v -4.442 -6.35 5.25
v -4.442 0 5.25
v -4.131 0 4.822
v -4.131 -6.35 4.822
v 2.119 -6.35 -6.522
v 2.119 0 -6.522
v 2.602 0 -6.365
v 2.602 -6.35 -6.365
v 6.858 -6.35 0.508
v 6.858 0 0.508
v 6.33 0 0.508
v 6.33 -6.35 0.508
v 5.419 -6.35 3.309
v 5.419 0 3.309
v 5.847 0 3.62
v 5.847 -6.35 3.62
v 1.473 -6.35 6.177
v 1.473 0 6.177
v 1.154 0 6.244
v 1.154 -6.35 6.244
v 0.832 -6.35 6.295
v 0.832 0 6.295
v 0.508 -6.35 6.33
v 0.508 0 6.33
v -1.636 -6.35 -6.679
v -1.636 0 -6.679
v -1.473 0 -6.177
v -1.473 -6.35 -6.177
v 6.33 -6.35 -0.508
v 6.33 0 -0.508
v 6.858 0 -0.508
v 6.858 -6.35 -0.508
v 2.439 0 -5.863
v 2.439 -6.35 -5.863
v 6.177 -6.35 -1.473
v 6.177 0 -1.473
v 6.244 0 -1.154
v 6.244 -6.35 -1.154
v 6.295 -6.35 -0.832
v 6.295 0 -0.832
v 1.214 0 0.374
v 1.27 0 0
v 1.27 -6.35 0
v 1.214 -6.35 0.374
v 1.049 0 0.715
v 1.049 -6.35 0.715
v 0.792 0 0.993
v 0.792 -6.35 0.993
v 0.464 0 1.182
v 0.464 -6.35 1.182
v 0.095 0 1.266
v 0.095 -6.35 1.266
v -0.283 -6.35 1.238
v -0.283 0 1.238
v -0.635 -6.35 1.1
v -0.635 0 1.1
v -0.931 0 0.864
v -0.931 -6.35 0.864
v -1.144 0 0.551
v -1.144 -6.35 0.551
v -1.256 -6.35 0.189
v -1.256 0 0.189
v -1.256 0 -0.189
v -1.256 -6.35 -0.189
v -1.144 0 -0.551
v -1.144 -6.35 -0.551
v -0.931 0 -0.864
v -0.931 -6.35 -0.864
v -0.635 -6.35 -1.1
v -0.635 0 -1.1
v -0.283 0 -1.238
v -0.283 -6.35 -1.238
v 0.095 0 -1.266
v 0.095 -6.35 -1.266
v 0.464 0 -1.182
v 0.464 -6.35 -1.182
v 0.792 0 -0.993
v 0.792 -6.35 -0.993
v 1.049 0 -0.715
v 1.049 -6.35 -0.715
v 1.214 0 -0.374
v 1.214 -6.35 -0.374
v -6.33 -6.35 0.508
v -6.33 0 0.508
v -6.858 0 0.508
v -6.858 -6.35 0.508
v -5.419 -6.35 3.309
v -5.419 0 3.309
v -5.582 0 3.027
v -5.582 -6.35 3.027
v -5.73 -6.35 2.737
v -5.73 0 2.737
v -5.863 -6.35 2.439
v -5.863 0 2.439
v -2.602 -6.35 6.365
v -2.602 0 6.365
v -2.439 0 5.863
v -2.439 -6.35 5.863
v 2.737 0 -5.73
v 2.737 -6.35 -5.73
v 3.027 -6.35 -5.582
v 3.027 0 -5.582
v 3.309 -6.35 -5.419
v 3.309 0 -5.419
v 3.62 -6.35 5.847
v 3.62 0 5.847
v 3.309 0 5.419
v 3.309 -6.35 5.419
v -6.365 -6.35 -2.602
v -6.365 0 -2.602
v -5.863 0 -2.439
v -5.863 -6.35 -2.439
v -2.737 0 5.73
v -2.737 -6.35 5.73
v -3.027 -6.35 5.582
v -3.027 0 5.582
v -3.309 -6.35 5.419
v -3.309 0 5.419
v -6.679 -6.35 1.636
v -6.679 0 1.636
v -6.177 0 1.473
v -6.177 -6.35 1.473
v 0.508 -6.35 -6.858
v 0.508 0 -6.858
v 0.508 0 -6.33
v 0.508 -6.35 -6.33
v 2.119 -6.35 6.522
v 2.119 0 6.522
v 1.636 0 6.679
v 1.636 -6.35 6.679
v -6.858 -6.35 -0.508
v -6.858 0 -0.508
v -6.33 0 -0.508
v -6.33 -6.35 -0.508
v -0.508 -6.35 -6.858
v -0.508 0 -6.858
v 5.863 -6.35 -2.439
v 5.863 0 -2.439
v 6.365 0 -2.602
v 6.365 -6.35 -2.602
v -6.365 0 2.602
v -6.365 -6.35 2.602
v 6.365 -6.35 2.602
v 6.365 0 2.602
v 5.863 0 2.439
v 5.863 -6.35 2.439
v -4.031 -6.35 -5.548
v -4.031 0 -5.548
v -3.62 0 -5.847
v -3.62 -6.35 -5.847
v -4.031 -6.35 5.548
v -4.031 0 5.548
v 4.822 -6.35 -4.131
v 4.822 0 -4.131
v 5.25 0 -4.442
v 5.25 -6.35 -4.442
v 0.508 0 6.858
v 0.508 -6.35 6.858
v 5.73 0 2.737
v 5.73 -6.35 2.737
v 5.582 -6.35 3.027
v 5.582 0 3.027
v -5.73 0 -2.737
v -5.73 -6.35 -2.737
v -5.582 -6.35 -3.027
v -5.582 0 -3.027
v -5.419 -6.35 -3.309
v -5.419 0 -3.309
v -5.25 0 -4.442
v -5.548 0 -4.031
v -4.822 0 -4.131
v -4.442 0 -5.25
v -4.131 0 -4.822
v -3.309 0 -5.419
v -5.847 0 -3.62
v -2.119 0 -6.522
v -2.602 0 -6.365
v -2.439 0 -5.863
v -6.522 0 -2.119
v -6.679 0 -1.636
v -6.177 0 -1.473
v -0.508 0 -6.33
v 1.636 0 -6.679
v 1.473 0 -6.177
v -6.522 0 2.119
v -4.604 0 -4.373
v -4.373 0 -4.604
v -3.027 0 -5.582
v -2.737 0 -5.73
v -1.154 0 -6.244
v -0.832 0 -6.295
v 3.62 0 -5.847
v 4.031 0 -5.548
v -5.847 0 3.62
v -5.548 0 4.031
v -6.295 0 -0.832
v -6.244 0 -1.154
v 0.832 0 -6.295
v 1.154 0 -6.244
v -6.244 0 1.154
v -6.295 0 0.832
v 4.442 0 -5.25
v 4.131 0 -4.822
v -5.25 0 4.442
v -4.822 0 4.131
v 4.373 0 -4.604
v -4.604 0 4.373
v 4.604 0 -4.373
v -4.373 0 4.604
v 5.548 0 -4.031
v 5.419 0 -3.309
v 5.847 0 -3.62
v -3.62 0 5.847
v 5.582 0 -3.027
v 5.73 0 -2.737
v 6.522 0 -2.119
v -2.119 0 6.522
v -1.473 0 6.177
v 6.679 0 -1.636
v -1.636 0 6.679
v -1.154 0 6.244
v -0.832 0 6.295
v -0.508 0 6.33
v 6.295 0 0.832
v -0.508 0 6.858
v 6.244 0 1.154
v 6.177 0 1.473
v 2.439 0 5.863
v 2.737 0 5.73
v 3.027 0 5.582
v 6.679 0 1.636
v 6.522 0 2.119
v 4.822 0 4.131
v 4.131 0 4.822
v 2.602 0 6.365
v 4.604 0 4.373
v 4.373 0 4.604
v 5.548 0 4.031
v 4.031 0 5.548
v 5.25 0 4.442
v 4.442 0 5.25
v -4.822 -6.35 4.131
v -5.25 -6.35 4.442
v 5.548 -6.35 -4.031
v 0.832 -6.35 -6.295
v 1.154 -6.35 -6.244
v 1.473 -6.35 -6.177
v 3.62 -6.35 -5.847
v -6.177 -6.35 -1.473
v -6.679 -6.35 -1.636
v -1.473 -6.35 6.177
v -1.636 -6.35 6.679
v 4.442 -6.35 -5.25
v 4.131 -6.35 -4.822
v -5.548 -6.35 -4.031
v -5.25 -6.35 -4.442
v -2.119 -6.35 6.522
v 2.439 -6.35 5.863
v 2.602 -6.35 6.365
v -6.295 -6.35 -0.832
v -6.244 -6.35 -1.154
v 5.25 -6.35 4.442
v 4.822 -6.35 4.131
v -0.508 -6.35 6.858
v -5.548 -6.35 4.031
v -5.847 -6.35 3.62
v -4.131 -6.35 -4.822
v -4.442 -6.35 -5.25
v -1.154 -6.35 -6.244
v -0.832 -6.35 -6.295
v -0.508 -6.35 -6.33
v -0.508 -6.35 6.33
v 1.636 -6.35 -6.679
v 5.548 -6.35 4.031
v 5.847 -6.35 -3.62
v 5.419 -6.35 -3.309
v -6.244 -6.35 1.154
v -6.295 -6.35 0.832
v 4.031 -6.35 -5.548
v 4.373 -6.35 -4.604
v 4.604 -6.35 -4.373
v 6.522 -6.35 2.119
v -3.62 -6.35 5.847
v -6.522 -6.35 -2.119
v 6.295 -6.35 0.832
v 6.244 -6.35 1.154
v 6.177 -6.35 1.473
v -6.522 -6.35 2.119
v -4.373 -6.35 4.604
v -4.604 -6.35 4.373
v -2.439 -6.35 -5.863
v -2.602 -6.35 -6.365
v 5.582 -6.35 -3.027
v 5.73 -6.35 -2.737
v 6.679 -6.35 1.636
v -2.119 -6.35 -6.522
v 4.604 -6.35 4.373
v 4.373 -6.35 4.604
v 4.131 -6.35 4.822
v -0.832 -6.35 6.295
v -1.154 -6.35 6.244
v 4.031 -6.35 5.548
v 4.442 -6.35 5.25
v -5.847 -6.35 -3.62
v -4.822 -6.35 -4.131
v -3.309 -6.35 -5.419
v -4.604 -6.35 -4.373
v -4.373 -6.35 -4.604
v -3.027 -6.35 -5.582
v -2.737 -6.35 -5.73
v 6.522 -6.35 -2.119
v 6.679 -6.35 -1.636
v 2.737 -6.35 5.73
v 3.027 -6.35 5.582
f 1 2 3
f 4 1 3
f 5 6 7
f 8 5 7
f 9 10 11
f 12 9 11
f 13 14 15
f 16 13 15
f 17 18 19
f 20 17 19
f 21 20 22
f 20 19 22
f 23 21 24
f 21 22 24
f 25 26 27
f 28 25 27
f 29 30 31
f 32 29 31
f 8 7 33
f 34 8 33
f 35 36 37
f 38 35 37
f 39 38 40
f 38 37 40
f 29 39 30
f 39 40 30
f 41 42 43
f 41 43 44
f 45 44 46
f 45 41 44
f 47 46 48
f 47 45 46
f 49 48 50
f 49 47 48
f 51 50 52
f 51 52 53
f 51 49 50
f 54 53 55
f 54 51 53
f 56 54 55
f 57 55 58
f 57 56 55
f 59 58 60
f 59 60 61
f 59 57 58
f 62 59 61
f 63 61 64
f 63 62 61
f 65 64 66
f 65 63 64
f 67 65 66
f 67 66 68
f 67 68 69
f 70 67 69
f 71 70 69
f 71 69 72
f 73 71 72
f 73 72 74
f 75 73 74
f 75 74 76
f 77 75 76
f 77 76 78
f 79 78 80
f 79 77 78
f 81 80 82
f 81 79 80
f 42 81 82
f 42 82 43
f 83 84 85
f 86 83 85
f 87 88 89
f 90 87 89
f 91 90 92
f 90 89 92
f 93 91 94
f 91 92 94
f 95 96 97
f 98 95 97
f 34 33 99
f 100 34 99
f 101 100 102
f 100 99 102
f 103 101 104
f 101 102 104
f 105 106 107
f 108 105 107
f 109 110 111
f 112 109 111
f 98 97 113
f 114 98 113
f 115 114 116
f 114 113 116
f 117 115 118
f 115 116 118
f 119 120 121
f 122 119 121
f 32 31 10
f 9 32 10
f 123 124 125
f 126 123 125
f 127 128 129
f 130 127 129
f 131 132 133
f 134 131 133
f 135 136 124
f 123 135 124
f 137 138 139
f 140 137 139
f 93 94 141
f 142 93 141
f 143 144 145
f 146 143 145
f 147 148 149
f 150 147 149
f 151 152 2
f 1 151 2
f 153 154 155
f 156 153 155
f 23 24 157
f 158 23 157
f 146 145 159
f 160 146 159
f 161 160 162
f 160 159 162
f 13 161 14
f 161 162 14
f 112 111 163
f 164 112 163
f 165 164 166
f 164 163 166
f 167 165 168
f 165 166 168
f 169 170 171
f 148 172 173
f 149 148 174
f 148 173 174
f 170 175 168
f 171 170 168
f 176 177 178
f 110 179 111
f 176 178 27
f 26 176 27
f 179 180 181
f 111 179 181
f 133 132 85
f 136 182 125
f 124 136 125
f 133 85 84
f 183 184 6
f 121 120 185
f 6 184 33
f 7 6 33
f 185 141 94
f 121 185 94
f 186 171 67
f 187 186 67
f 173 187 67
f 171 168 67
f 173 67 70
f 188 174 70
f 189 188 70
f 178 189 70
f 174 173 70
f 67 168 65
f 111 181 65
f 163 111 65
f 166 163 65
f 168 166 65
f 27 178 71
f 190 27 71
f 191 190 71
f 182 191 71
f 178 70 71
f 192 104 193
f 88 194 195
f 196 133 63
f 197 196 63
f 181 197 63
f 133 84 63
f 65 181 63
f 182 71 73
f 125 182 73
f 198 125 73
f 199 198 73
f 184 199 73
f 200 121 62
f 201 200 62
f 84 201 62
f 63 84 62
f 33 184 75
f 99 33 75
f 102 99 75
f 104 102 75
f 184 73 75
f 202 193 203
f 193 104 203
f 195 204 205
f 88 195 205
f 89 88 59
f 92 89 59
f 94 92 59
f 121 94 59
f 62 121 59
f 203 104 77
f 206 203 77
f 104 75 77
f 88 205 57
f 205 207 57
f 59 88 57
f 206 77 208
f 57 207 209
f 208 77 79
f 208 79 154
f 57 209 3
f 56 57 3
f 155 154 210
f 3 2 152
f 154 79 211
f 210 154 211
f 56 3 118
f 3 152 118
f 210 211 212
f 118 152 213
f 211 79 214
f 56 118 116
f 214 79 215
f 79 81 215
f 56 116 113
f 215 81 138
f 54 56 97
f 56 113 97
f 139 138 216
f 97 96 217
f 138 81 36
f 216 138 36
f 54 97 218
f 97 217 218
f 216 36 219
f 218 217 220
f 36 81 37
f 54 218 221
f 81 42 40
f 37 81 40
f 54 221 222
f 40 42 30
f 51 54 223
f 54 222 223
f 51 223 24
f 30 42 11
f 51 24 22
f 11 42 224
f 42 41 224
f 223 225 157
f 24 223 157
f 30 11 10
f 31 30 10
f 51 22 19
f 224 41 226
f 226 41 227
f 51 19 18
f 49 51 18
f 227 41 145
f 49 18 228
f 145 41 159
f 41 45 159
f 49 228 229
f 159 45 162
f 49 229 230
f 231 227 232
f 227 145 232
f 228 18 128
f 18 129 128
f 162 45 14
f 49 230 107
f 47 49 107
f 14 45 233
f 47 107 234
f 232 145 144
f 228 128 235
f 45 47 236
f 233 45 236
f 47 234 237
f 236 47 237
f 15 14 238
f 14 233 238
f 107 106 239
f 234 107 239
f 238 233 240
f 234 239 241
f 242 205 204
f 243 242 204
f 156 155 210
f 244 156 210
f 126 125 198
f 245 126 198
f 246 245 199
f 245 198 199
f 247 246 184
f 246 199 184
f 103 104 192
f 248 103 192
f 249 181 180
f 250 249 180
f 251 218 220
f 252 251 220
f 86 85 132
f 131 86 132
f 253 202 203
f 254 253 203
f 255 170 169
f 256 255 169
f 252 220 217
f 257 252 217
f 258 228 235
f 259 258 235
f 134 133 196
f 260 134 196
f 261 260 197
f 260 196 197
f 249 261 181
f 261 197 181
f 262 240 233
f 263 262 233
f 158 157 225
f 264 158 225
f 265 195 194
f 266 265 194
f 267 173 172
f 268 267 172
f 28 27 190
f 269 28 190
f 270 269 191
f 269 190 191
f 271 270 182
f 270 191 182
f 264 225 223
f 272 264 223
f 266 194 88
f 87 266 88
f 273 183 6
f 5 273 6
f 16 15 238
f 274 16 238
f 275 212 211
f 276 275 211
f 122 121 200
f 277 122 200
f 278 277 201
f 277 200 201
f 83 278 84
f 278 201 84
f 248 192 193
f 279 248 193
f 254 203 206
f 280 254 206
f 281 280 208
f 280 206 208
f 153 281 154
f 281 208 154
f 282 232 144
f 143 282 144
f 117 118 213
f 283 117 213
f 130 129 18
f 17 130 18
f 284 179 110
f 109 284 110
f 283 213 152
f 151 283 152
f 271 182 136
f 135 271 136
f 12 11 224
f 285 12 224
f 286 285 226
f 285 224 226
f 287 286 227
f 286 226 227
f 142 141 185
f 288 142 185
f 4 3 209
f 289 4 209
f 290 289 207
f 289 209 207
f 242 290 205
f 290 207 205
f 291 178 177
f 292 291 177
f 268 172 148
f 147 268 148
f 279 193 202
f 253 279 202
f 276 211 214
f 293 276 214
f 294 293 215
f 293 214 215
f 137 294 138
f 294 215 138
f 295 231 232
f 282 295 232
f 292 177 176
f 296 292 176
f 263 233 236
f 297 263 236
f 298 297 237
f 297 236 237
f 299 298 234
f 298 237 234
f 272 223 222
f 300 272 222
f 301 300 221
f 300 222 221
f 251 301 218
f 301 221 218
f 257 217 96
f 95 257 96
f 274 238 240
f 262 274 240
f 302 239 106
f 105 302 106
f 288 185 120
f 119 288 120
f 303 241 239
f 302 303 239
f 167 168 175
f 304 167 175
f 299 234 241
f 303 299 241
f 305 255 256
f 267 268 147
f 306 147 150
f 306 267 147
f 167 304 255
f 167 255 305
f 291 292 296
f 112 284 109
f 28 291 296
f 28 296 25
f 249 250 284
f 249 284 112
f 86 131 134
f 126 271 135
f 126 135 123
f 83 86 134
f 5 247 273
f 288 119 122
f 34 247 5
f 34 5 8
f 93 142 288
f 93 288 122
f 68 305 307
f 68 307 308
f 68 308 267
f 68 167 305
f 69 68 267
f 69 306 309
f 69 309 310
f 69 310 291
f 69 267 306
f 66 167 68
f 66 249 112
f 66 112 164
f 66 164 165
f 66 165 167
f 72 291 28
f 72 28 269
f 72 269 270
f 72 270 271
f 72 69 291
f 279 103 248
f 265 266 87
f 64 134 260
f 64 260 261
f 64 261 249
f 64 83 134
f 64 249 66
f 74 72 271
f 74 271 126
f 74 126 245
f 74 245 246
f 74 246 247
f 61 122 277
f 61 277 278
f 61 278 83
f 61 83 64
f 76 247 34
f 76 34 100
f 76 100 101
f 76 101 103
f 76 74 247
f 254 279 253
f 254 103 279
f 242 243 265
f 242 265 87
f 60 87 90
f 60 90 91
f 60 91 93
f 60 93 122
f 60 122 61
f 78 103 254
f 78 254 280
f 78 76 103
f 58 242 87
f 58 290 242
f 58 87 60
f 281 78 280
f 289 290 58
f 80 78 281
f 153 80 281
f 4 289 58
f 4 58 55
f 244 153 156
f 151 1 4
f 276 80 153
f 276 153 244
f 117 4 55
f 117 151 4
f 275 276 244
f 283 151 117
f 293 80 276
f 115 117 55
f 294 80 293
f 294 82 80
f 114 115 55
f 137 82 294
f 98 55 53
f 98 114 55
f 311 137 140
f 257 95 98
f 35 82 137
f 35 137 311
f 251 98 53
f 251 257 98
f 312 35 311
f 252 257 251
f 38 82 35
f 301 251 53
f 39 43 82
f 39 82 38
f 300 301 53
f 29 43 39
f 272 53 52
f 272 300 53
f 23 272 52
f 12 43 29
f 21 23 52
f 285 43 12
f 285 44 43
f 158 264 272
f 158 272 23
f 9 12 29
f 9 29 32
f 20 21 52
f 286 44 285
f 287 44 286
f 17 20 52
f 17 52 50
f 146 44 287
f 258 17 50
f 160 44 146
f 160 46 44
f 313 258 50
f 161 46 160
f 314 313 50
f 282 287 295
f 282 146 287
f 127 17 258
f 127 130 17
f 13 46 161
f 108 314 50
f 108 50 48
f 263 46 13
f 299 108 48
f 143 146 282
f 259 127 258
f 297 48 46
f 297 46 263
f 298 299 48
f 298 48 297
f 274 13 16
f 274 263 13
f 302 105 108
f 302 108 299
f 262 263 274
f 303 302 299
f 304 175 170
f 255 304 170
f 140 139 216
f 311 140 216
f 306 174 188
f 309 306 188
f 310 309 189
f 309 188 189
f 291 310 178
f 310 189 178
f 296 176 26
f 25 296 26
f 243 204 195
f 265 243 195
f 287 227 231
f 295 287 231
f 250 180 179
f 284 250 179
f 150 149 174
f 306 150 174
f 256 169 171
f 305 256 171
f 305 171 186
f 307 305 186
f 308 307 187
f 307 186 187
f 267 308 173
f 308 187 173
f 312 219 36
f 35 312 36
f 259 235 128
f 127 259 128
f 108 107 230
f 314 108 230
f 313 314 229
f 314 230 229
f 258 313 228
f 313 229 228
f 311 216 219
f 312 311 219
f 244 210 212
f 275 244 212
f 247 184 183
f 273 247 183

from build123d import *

# Parameters (mm, degrees)
F0_R     = 1.27
F1_DEPTH = 6.35


# Not quite as in the source:
# - a feature names something its author has since deleted; it is built from what else it names


with BuildPart() as f1:
    # F0 (on Front) → F1 (new body)
    with BuildSketch(Plane.XZ):
        with BuildLine():
            ThreePointArc((-2.4391053202, 5.8628717568), (-1.9622579143, 6.0392088785), (-1.4728318996, 6.1768330231))
            Line((-1.4728318996, 6.1768330231), (-1.6361018371, 6.6793262219))
            Line((-1.6361018371, 6.6793262219), (-2.1192385474, 6.5223455888))
            Line((-2.1192385474, 6.5223455888), (-2.6023752577, 6.3653649556))
            Line((-2.6023752577, 6.3653649556), (-2.4391053202, 5.8628717568))
        make_face()
        with BuildLine():
            ThreePointArc((-0.508, 6.3296473835), (-0.2542037711, 6.3449098057), (0, 6.35))
            Line((0, 6.35), (0, 6.858))
            Line((0, 6.858), (-0.508, 6.858))
            Line((-0.508, 6.858), (-0.508, 6.3296473835))
        make_face()
        with BuildLine():
            ThreePointArc((0, 6.35), (0.2542037711, 6.3449098057), (0.508, 6.3296473835))
            Line((0.508, 6.3296473835), (0.508, 6.858))
            Line((0.508, 6.858), (0, 6.858))
            Line((0, 6.858), (0, 6.35))
        make_face()
        with BuildLine():
            ThreePointArc((1.4728318996, 6.1768330231), (1.9622579143, 6.0392088785), (2.4391053202, 5.8628717568))
            Line((2.4391053202, 5.8628717568), (2.6023752577, 6.3653649556))
            Line((2.6023752577, 6.3653649556), (2.1192385474, 6.5223455888))
            Line((2.1192385474, 6.5223455888), (1.6361018371, 6.6793262219))
            Line((1.6361018371, 6.6793262219), (1.4728318996, 6.1768330231))
        make_face()
        with BuildLine():
            ThreePointArc((3.3094927511, 5.4193872099), (3.7324363521, 5.1372579143), (4.1314540174, 4.8221973935))
            Line((4.1314540174, 4.8221973935), (4.4420118934, 5.2496436393))
            Line((4.4420118934, 5.2496436393), (4.0310312602, 5.5482385474))
            Line((4.0310312602, 5.5482385474), (3.6200506271, 5.8468334556))
            Line((3.6200506271, 5.8468334556), (3.3094927511, 5.4193872099))
        make_face()
        with BuildLine():
            ThreePointArc((4.8221973935, 4.1314540174), (5.1372579143, 3.7324363521), (5.4193872099, 3.3094927511))
            Line((5.4193872099, 3.3094927511), (5.8468334556, 3.6200506271))
            Line((5.8468334556, 3.6200506271), (5.5482385474, 4.0310312602))
            Line((5.5482385474, 4.0310312602), (5.2496436393, 4.4420118934))
            Line((5.2496436393, 4.4420118934), (4.8221973935, 4.1314540174))
        make_face()
        with BuildLine():
            Line((0.508, -6.858), (0.508, -6.3296473835))
            ThreePointArc((0.508, -6.3296473835), (0, -6.35), (-0.508, -6.3296473835))
            Line((-0.508, -6.3296473835), (-0.508, -6.858))
            Line((-0.508, -6.858), (0, -6.858))
            Line((0, -6.858), (0.508, -6.858))
        make_face()
        with BuildLine():
            Line((2.6023752577, -6.3653649556), (2.4391053202, -5.8628717568))
            ThreePointArc((2.4391053202, -5.8628717568), (1.9622579143, -6.0392088785), (1.4728318996, -6.1768330231))
            Line((1.4728318996, -6.1768330231), (1.6361018371, -6.6793262219))
            Line((1.6361018371, -6.6793262219), (2.1192385474, -6.5223455888))
            Line((2.1192385474, -6.5223455888), (2.6023752577, -6.3653649556))
        make_face()
        with BuildLine():
            Line((4.4420118934, -5.2496436393), (4.1314540174, -4.8221973935))
            ThreePointArc((4.1314540174, -4.8221973935), (3.7324363521, -5.1372579143), (3.3094927511, -5.4193872099))
            Line((3.3094927511, -5.4193872099), (3.6200506271, -5.8468334556))
            Line((3.6200506271, -5.8468334556), (4.0310312602, -5.5482385474))
            Line((4.0310312602, -5.5482385474), (4.4420118934, -5.2496436393))
        make_face()
        with BuildLine():
            Line((5.8468334556, -3.6200506271), (5.4193872099, -3.3094927511))
            ThreePointArc((5.4193872099, -3.3094927511), (5.1372579143, -3.7324363521), (4.8221973935, -4.1314540174))
            Line((4.8221973935, -4.1314540174), (5.2496436393, -4.4420118934))
            Line((5.2496436393, -4.4420118934), (5.5482385474, -4.0310312602))
            Line((5.5482385474, -4.0310312602), (5.8468334556, -3.6200506271))
        make_face()
        with BuildLine():
            Line((6.6793262219, -1.6361018371), (6.1768330231, -1.4728318996))
            ThreePointArc((6.1768330231, -1.4728318996), (6.0392088785, -1.9622579143), (5.8628717568, -2.4391053202))
            Line((5.8628717568, -2.4391053202), (6.3653649556, -2.6023752577))
            Line((6.3653649556, -2.6023752577), (6.5223455888, -2.1192385474))
            Line((6.5223455888, -2.1192385474), (6.6793262219, -1.6361018371))
        make_face()
        with BuildLine():
            ThreePointArc((6.3296473835, 0.508), (6.3449098057, 0.2542037711), (6.35, 0))
            ThreePointArc((6.35, 0), (6.3449098057, -0.2542037711), (6.3296473835, -0.508))
            Line((6.3296473835, -0.508), (6.858, -0.508))
            Line((6.858, -0.508), (6.858, 0))
            Line((6.858, 0), (6.858, 0.508))
            Line((6.858, 0.508), (6.3296473835, 0.508))
        make_face()
        with BuildLine():
            ThreePointArc((5.8628717568, 2.4391053202), (6.0392088785, 1.9622579143), (6.1768330231, 1.4728318996))
            Line((6.1768330231, 1.4728318996), (6.6793262219, 1.6361018371))
            Line((6.6793262219, 1.6361018371), (6.5223455888, 2.1192385474))
            Line((6.5223455888, 2.1192385474), (6.3653649556, 2.6023752577))
            Line((6.3653649556, 2.6023752577), (5.8628717568, 2.4391053202))
        make_face()
        with BuildLine():
            ThreePointArc((-4.1314540174, 4.8221973935), (-3.7324363521, 5.1372579143), (-3.3094927511, 5.4193872099))
            Line((-3.3094927511, 5.4193872099), (-3.6200506271, 5.8468334556))
            Line((-3.6200506271, 5.8468334556), (-4.0310312602, 5.5482385474))
            Line((-4.0310312602, 5.5482385474), (-4.4420118934, 5.2496436393))
            Line((-4.4420118934, 5.2496436393), (-4.1314540174, 4.8221973935))
        make_face()
        with BuildLine():
            ThreePointArc((-5.4193872099, 3.3094927511), (-5.1372579143, 3.7324363521), (-4.8221973935, 4.1314540174))
            Line((-4.8221973935, 4.1314540174), (-5.2496436393, 4.4420118934))
            Line((-5.2496436393, 4.4420118934), (-5.5482385474, 4.0310312602))
            Line((-5.5482385474, 4.0310312602), (-5.8468334556, 3.6200506271))
            Line((-5.8468334556, 3.6200506271), (-5.4193872099, 3.3094927511))
        make_face()
        with BuildLine():
            ThreePointArc((-6.1768330231, 1.4728318996), (-6.0392088785, 1.9622579143), (-5.8628717568, 2.4391053202))
            Line((-5.8628717568, 2.4391053202), (-6.3653649556, 2.6023752577))
            Line((-6.3653649556, 2.6023752577), (-6.5223455888, 2.1192385474))
            Line((-6.5223455888, 2.1192385474), (-6.6793262219, 1.6361018371))
            Line((-6.6793262219, 1.6361018371), (-6.1768330231, 1.4728318996))
        make_face()
        with BuildLine():
            Line((-6.858, -0.508), (-6.3296473835, -0.508))
            ThreePointArc((-6.3296473835, -0.508), (-6.35, 0), (-6.3296473835, 0.508))
            Line((-6.3296473835, 0.508), (-6.858, 0.508))
            Line((-6.858, 0.508), (-6.858, 0))
            Line((-6.858, 0), (-6.858, -0.508))
        make_face()
        with BuildLine():
            ThreePointArc((6.3296473835, -0.508), (6.3449098057, -0.2542037711), (6.35, 0))
            ThreePointArc((6.35, 0), (6.3449098057, 0.2542037711), (6.3296473835, 0.508))
            ThreePointArc((6.3296473835, 0.508), (6.2718209628, 0.993358853), (6.1768330231, 1.4728318996))
            ThreePointArc((6.1768330231, 1.4728318996), (6.0392088785, 1.9622579143), (5.8628717568, 2.4391053202))
            ThreePointArc((5.8628717568, 2.4391053202), (5.6578914286, 2.8828396733), (5.4193872099, 3.3094927511))
            ThreePointArc((5.4193872099, 3.3094927511), (5.1372579143, 3.7324363521), (4.8221973935, 4.1314540174))
            ThreePointArc((4.8221973935, 4.1314540174), (4.4901280605, 4.4901280605), (4.1314540174, 4.8221973935))
            ThreePointArc((4.1314540174, 4.8221973935), (3.7324363521, 5.1372579143), (3.3094927511, 5.4193872099))
            ThreePointArc((3.3094927511, 5.4193872099), (2.8828396733, 5.6578914286), (2.4391053202, 5.8628717568))
            ThreePointArc((2.4391053202, 5.8628717568), (1.9622579143, 6.0392088785), (1.4728318996, 6.1768330231))
            ThreePointArc((1.4728318996, 6.1768330231), (0.993358853, 6.2718209628), (0.508, 6.3296473835))
            ThreePointArc((0.508, 6.3296473835), (0.2542037711, 6.3449098057), (0, 6.35))
            ThreePointArc((0, 6.35), (-0.2542037711, 6.3449098057), (-0.508, 6.3296473835))
            ThreePointArc((-0.508, 6.3296473835), (-0.993358853, 6.2718209628), (-1.4728318996, 6.1768330231))
            ThreePointArc((-1.4728318996, 6.1768330231), (-1.9622579143, 6.0392088785), (-2.4391053202, 5.8628717568))
            ThreePointArc((-2.4391053202, 5.8628717568), (-2.8828396733, 5.6578914286), (-3.3094927511, 5.4193872099))
            ThreePointArc((-3.3094927511, 5.4193872099), (-3.7324363521, 5.1372579143), (-4.1314540174, 4.8221973935))
            ThreePointArc((-4.1314540174, 4.8221973935), (-4.4901280605, 4.4901280605), (-4.8221973935, 4.1314540174))
            ThreePointArc((-4.8221973935, 4.1314540174), (-5.1372579143, 3.7324363521), (-5.4193872099, 3.3094927511))
            ThreePointArc((-5.4193872099, 3.3094927511), (-5.6578914286, 2.8828396733), (-5.8628717568, 2.4391053202))
            ThreePointArc((-5.8628717568, 2.4391053202), (-6.0392088785, 1.9622579143), (-6.1768330231, 1.4728318996))
            ThreePointArc((-6.1768330231, 1.4728318996), (-6.2718209628, 0.993358853), (-6.3296473835, 0.508))
            ThreePointArc((-6.3296473835, 0.508), (-6.35, 0), (-6.3296473835, -0.508))
            ThreePointArc((-6.3296473835, -0.508), (-6.2718209628, -0.993358853), (-6.1768330231, -1.4728318996))
            ThreePointArc((-6.1768330231, -1.4728318996), (-6.0392088785, -1.9622579143), (-5.8628717568, -2.4391053202))
            ThreePointArc((-5.8628717568, -2.4391053202), (-5.6578914286, -2.8828396733), (-5.4193872099, -3.3094927511))
            ThreePointArc((-5.4193872099, -3.3094927511), (-5.1372579143, -3.7324363521), (-4.8221973935, -4.1314540174))
            ThreePointArc((-4.8221973935, -4.1314540174), (-4.4901280605, -4.4901280605), (-4.1314540174, -4.8221973935))
            ThreePointArc((-4.1314540174, -4.8221973935), (-3.7324363521, -5.1372579143), (-3.3094927511, -5.4193872099))
            ThreePointArc((-3.3094927511, -5.4193872099), (-2.8828396733, -5.6578914286), (-2.4391053202, -5.8628717568))
            ThreePointArc((-2.4391053202, -5.8628717568), (-1.9622579143, -6.0392088785), (-1.4728318996, -6.1768330231))
            ThreePointArc((-1.4728318996, -6.1768330231), (-0.993358853, -6.2718209628), (-0.508, -6.3296473835))
            ThreePointArc((-0.508, -6.3296473835), (0, -6.35), (0.508, -6.3296473835))
            ThreePointArc((0.508, -6.3296473835), (0.993358853, -6.2718209628), (1.4728318996, -6.1768330231))
            ThreePointArc((1.4728318996, -6.1768330231), (1.9622579143, -6.0392088785), (2.4391053202, -5.8628717568))
            ThreePointArc((2.4391053202, -5.8628717568), (2.8828396733, -5.6578914286), (3.3094927511, -5.4193872099))
            ThreePointArc((3.3094927511, -5.4193872099), (3.7324363521, -5.1372579143), (4.1314540174, -4.8221973935))
            ThreePointArc((4.1314540174, -4.8221973935), (4.4901280605, -4.4901280605), (4.8221973935, -4.1314540174))
            ThreePointArc((4.8221973935, -4.1314540174), (5.1372579143, -3.7324363521), (5.4193872099, -3.3094927511))
            ThreePointArc((5.4193872099, -3.3094927511), (5.6578914286, -2.8828396733), (5.8628717568, -2.4391053202))
            ThreePointArc((5.8628717568, -2.4391053202), (6.0392088785, -1.9622579143), (6.1768330231, -1.4728318996))
            ThreePointArc((6.1768330231, -1.4728318996), (6.2718209628, -0.993358853), (6.3296473835, -0.508))
        make_face()
        Circle(F0_R, mode=Mode.SUBTRACT)
        with BuildLine():
            Line((-6.3653649556, -2.6023752577), (-5.8628717568, -2.4391053202))
            ThreePointArc((-5.8628717568, -2.4391053202), (-6.0392088785, -1.9622579143), (-6.1768330231, -1.4728318996))
            Line((-6.1768330231, -1.4728318996), (-6.6793262219, -1.6361018371))
            Line((-6.6793262219, -1.6361018371), (-6.5223455888, -2.1192385474))
            Line((-6.5223455888, -2.1192385474), (-6.3653649556, -2.6023752577))
        make_face()
        with BuildLine():
            Line((-5.2496436393, -4.4420118934), (-4.8221973935, -4.1314540174))
            ThreePointArc((-4.8221973935, -4.1314540174), (-5.1372579143, -3.7324363521), (-5.4193872099, -3.3094927511))
            Line((-5.4193872099, -3.3094927511), (-5.8468334556, -3.6200506271))
            Line((-5.8468334556, -3.6200506271), (-5.5482385474, -4.0310312602))
            Line((-5.5482385474, -4.0310312602), (-5.2496436393, -4.4420118934))
        make_face()
        with BuildLine():
            Line((-3.6200506271, -5.8468334556), (-3.3094927511, -5.4193872099))
            ThreePointArc((-3.3094927511, -5.4193872099), (-3.7324363521, -5.1372579143), (-4.1314540174, -4.8221973935))
            Line((-4.1314540174, -4.8221973935), (-4.4420118934, -5.2496436393))
            Line((-4.4420118934, -5.2496436393), (-4.0310312602, -5.5482385474))
            Line((-4.0310312602, -5.5482385474), (-3.6200506271, -5.8468334556))
        make_face()
        with BuildLine():
            Line((-1.6361018371, -6.6793262219), (-1.4728318996, -6.1768330231))
            ThreePointArc((-1.4728318996, -6.1768330231), (-1.9622579143, -6.0392088785), (-2.4391053202, -5.8628717568))
            Line((-2.4391053202, -5.8628717568), (-2.6023752577, -6.3653649556))
            Line((-2.6023752577, -6.3653649556), (-2.1192385474, -6.5223455888))
            Line((-2.1192385474, -6.5223455888), (-1.6361018371, -6.6793262219))
        make_face()
    extrude(amount=F1_DEPTH)


solid = f1.part
